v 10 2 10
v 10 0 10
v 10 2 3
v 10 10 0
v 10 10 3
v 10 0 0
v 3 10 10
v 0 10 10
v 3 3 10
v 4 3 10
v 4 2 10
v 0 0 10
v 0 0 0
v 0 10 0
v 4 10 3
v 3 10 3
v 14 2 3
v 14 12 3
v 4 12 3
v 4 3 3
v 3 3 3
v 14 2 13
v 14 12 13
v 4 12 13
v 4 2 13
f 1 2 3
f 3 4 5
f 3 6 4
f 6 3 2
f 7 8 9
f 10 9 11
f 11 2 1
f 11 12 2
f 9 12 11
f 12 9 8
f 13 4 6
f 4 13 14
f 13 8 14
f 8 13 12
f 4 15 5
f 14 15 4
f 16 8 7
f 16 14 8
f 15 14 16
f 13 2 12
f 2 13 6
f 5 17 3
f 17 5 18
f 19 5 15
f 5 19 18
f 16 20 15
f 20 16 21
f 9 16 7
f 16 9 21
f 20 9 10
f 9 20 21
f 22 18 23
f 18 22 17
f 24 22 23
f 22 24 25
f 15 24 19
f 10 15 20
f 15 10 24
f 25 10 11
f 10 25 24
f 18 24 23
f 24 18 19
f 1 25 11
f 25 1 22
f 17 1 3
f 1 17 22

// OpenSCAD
/*
F6 rendering not showing color in OpenSCAD version 2015.03-1
openscad --autocenter --projection=ortho --preview --viewall -o test.png test_color.scad
openscad --autocenter --projection=ortho --preview --camera=50,50,50,0,0,0 -o test.png test_color.scad
*/

difference(){
    color("green") cube([10,10,10]);
    color("red") translate([3,3,3]) cube([10,10,10]);
}
color([255,0,0,0.5]) translate([4,2,3]) cube([10,10,10]);
